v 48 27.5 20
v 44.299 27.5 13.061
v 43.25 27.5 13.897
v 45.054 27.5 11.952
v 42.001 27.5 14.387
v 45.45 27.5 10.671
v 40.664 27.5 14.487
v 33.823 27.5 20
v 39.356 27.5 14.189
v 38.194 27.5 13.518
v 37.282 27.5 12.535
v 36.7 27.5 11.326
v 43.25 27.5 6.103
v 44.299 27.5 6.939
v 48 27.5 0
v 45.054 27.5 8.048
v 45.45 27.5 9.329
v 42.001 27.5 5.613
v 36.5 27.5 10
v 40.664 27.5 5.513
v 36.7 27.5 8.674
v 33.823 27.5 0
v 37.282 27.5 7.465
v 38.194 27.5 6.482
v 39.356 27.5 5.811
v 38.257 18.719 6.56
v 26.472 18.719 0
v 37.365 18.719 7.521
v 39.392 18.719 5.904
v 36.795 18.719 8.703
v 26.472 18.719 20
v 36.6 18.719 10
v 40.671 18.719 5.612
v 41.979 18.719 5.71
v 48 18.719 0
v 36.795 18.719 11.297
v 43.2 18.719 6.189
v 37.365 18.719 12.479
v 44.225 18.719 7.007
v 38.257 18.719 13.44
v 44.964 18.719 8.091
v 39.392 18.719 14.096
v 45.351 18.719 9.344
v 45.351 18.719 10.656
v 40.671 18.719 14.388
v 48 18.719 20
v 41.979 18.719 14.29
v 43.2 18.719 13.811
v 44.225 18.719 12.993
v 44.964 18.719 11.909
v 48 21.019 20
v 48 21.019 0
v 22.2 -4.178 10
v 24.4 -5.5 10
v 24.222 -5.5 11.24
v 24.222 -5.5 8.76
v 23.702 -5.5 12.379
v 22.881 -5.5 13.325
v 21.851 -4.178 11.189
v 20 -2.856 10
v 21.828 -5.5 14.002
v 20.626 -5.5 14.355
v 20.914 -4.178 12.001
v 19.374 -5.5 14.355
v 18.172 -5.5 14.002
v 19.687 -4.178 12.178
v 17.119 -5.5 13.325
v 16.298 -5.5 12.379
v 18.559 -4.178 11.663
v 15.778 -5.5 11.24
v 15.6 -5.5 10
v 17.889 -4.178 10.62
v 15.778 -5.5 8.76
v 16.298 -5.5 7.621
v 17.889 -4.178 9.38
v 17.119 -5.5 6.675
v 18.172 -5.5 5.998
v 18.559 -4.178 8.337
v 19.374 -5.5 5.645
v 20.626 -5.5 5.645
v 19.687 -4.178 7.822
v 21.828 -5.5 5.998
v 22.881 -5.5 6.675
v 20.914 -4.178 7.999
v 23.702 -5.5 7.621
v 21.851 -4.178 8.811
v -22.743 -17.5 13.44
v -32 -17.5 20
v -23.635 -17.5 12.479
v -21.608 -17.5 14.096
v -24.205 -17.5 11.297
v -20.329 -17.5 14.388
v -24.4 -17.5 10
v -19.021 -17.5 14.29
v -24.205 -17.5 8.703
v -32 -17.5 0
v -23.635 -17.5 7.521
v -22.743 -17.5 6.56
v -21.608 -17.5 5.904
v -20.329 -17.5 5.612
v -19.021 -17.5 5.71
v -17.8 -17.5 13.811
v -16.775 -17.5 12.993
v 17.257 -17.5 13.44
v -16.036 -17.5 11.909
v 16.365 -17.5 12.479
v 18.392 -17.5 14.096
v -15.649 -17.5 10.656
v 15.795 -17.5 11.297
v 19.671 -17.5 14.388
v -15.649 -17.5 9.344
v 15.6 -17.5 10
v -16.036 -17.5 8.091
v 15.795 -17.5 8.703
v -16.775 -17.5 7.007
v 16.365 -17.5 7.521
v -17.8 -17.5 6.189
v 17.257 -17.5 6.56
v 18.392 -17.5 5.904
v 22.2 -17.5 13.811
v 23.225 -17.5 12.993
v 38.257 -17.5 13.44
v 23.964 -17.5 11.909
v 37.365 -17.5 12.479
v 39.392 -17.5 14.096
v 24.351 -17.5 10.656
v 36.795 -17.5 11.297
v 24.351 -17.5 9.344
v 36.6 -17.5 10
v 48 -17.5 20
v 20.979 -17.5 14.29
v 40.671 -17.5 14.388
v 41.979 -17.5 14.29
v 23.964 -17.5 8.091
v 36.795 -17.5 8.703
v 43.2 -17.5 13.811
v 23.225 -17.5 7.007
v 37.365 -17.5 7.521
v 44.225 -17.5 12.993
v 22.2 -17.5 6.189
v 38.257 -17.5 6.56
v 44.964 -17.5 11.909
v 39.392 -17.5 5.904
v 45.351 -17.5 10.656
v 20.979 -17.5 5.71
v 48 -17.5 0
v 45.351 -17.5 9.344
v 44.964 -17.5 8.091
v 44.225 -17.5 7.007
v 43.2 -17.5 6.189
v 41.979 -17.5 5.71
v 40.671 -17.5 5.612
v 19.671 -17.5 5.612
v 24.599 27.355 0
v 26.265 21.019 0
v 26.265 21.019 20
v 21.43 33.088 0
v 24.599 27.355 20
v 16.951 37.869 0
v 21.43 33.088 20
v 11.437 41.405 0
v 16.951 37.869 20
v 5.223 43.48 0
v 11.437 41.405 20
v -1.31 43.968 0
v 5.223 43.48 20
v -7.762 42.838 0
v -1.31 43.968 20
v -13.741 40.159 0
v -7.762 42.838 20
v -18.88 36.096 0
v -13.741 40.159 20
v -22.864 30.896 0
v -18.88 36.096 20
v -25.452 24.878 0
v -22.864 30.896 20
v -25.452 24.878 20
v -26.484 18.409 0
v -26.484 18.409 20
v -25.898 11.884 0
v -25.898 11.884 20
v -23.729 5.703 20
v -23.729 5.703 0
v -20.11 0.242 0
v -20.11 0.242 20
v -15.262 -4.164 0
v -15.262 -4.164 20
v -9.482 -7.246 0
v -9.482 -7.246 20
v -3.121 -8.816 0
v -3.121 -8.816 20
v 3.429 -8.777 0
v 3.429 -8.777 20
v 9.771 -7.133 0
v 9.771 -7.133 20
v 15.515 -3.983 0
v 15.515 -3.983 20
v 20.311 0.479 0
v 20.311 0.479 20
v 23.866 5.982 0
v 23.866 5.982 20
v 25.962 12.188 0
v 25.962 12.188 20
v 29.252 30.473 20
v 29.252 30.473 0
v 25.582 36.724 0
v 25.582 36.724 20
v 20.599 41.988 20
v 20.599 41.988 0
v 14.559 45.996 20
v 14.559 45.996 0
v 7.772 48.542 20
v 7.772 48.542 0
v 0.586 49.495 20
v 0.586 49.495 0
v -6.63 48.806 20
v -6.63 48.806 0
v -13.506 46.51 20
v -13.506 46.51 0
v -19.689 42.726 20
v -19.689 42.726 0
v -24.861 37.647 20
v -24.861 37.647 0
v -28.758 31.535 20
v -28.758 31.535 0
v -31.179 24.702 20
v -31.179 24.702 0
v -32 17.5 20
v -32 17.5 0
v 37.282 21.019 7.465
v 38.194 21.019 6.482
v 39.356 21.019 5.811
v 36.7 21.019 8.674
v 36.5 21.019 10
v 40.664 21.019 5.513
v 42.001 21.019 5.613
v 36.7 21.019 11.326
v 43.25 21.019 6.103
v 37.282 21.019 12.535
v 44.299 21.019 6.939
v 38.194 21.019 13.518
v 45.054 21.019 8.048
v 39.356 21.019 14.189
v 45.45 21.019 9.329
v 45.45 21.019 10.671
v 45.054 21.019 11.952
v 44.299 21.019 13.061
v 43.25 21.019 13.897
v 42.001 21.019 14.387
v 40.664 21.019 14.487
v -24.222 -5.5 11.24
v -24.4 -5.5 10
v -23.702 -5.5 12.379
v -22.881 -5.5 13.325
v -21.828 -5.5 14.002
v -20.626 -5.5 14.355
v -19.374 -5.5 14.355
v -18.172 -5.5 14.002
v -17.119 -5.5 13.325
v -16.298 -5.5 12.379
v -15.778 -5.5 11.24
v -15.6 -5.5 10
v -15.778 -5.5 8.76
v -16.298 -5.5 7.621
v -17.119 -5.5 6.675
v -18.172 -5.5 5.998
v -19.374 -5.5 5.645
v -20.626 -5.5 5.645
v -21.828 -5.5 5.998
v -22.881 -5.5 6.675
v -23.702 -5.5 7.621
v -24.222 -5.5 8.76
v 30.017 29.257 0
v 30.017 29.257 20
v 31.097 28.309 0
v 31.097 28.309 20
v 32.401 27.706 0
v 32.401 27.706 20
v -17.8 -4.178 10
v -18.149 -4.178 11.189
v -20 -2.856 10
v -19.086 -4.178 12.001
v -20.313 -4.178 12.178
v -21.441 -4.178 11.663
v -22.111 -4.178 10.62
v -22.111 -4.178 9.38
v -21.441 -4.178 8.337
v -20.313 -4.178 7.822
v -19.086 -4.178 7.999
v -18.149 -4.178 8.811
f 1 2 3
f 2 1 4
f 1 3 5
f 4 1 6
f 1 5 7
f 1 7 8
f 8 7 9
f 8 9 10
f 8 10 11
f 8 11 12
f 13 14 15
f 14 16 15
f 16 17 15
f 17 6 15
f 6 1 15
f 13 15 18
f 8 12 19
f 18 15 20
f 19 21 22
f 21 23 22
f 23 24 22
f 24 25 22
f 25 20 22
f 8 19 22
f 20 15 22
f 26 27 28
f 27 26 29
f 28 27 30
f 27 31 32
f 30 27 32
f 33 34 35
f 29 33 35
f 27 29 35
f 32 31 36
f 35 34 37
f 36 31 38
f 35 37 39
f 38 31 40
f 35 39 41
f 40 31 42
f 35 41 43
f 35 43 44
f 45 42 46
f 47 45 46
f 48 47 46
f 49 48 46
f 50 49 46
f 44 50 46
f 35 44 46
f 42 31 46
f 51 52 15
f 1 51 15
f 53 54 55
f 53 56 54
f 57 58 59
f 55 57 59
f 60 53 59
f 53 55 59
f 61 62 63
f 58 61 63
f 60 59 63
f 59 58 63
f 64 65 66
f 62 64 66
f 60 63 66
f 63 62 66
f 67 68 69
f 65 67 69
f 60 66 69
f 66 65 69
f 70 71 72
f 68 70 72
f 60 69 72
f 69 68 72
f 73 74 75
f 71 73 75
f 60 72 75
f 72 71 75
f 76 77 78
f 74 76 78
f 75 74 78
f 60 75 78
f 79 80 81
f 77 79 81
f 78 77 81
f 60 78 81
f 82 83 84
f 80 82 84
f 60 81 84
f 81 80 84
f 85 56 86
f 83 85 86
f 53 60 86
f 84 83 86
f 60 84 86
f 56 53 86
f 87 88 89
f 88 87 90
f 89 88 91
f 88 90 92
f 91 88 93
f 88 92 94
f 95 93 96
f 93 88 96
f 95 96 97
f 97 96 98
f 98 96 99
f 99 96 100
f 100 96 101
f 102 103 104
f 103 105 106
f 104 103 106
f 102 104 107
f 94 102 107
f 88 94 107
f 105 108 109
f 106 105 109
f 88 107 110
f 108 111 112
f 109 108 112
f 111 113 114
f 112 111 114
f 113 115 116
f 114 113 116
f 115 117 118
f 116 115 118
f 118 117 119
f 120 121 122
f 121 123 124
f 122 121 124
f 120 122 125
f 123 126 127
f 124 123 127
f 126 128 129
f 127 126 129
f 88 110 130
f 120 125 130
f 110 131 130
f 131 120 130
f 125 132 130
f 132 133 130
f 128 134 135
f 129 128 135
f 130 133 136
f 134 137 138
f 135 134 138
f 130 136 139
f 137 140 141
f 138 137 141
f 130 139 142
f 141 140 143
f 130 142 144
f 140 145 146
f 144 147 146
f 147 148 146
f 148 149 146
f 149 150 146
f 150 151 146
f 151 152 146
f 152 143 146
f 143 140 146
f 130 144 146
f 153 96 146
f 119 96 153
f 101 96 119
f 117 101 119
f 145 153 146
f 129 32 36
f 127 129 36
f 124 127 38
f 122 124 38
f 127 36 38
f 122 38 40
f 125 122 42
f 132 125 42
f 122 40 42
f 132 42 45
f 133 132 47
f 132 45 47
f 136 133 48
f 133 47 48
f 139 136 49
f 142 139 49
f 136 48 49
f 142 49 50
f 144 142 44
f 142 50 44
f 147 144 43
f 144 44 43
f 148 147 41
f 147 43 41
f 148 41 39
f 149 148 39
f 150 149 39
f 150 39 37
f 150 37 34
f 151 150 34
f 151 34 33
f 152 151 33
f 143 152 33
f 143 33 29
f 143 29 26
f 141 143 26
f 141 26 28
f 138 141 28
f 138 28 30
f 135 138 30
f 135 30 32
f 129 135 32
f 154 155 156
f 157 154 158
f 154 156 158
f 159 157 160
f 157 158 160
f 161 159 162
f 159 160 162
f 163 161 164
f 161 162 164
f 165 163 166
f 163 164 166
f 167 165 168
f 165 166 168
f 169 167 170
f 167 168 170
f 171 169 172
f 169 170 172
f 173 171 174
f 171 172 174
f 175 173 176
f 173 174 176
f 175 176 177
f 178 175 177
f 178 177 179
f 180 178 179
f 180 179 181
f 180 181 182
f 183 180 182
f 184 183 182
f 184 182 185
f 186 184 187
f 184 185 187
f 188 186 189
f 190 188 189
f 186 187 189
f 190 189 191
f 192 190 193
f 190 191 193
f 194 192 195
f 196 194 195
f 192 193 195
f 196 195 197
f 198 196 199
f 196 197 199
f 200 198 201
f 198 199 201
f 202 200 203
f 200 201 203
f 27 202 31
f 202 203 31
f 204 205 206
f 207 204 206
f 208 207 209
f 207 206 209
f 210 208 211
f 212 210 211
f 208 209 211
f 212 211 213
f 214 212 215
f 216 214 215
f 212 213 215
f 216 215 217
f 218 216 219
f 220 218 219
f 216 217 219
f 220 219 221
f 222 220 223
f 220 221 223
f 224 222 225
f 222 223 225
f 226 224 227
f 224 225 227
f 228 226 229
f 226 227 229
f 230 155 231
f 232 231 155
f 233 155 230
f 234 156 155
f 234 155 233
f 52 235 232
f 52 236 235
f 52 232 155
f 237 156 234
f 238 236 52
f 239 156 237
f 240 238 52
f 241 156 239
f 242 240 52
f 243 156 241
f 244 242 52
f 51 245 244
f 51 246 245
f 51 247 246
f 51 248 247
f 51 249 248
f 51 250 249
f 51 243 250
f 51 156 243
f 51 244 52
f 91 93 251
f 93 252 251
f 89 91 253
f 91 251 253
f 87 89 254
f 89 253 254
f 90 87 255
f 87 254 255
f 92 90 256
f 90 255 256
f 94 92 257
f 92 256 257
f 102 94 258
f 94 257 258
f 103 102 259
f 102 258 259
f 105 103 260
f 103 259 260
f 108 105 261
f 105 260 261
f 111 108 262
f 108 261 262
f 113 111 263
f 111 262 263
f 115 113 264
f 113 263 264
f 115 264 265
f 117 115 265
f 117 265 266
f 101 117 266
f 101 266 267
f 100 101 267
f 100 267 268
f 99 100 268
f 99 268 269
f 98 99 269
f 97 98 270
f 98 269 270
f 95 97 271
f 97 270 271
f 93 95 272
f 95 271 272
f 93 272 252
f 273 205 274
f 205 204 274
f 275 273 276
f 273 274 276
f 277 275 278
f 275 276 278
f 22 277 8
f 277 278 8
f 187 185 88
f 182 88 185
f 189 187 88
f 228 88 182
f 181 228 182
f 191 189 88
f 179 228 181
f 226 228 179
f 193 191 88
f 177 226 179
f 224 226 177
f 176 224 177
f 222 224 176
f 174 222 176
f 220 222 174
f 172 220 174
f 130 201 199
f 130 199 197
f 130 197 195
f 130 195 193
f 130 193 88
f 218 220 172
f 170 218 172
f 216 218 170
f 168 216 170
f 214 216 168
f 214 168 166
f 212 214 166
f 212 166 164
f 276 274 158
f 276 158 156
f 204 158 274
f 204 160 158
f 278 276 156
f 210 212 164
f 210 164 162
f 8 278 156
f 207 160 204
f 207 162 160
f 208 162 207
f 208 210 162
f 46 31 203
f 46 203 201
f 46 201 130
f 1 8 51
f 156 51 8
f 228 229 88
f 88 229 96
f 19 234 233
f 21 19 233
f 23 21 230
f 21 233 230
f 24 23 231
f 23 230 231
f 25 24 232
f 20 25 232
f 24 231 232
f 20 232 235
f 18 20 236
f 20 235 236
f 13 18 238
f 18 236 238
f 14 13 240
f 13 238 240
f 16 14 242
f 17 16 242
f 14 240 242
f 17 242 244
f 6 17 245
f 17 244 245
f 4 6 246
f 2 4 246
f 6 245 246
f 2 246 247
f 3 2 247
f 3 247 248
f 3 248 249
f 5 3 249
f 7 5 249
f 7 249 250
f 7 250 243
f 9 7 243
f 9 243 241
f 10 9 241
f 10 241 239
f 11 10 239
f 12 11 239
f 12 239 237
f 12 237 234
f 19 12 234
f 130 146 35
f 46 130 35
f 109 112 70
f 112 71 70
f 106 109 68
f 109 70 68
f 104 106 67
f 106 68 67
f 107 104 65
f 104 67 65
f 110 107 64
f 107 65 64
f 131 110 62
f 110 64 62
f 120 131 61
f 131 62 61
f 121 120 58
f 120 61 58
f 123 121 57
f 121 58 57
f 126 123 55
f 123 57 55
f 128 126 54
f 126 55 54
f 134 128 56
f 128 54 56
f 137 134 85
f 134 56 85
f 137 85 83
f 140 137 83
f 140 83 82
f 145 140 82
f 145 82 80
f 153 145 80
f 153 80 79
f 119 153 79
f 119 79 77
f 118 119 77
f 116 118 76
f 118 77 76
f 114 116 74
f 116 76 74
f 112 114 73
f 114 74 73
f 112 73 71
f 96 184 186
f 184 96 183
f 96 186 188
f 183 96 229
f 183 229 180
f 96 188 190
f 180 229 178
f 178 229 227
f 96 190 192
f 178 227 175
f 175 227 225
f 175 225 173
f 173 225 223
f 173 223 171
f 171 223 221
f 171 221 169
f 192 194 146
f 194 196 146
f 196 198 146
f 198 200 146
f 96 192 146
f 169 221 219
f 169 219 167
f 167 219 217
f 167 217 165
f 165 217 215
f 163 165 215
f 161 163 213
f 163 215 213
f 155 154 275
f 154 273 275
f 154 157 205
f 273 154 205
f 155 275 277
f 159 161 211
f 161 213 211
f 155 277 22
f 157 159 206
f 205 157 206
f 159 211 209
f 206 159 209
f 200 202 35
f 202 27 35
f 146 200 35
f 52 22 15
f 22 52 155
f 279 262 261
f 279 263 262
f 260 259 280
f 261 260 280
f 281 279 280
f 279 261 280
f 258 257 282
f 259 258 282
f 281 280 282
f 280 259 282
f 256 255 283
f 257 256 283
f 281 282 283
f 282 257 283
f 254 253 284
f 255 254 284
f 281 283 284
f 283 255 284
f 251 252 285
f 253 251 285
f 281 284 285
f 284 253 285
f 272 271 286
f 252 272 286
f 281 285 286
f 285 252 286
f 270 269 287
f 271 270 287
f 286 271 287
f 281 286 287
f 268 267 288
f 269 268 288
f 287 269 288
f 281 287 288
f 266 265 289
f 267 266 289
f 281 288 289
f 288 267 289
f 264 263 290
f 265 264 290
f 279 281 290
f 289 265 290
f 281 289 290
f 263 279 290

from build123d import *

# Parameters (mm, degrees)
F1_DEPTH  = 20
F2_R      = 26.5
F3_DEPTH  = 20
F4_W      = 50
F4_H      = 2.3
F5_DEPTH  = 20.001
F7_D      = 8.8
F7_DEPTH  = 12
F7_TIP    = 2.6437867237
F8_R      = 5
F10_D     = 8.8
F10_DEPTH = 36.2202316189
F11_D     = 9
F11_DEPTH = 30.7817683811


# Not quite as in the source:
# - a feature of the source that left no trace in its solid (it failed there, or was rolled back) is left out


with BuildPart() as f1:
    # F0 (on Top) → F1 (new body)
    with BuildSketch(Plane.XY):
        with BuildLine():
            ThreePointArc((30.3973683071, 27.5), (-5.0638036184, 49.0968019412), (-32, 17.5))
            Line((-32, 17.5), (-32, -17.5))
            Line((-32, -17.5), (48, -17.5))
            Line((48, -17.5), (48, 27.5))
            Line((48, 27.5), (30.3973683071, 27.5))
        make_face()
    extrude(amount=F1_DEPTH)

    # F2 (on face) → F3 (cut, through all)
    with BuildSketch(Plane.XY.offset(20)):
        with Locations((0, 17.5)):
            Circle(F2_R)
    extrude(amount=-F3_DEPTH, mode=Mode.SUBTRACT)

    # F4 (on face) → F5 (cut, through all)
    with BuildSketch(Plane.XY.offset(20)):
        with Locations((45, 19.8692316189)):
            Rectangle(F4_W, F4_H)
    extrude(amount=-F5_DEPTH, mode=Mode.SUBTRACT)

    # F7
    with Locations(Plane.XZ.offset(17.5)):
        with Locations((-20, 10), (20, 10)):
            Hole(F7_D / 2, depth=F7_DEPTH)
            with Locations((0, 0, -(F7_DEPTH + F7_TIP / 2))):  # 118° drill point
                Cone(0, F7_D / 2, F7_TIP, mode=Mode.SUBTRACT)

    # F8
    f8_edges = [f1.edges().sort_by_distance(p)[0] for p in [
        (30.397368, 27.5, 10),
    ]]
    fillet(f8_edges, radius=F8_R)

    # F10 (through all, one way)
    with BuildSketch(Plane(origin=(0, 18.7192316189, 0), x_dir=(-1, 0, 0), z_dir=(0, 1, 0))):
        with Locations((-41, 10)):
            Circle(F10_D / 2)
    extrude(amount=-F10_DEPTH, mode=Mode.SUBTRACT)

    # F11 (through all, one way)
    with BuildSketch(Plane(origin=(0, 18.7192316189, 0), x_dir=(-1, 0, 0), z_dir=(0, -1, 0))):
        with Locations((-41, -10)):
            Circle(F11_D / 2)
    extrude(amount=-F11_DEPTH, mode=Mode.SUBTRACT)


solid = f1.part
